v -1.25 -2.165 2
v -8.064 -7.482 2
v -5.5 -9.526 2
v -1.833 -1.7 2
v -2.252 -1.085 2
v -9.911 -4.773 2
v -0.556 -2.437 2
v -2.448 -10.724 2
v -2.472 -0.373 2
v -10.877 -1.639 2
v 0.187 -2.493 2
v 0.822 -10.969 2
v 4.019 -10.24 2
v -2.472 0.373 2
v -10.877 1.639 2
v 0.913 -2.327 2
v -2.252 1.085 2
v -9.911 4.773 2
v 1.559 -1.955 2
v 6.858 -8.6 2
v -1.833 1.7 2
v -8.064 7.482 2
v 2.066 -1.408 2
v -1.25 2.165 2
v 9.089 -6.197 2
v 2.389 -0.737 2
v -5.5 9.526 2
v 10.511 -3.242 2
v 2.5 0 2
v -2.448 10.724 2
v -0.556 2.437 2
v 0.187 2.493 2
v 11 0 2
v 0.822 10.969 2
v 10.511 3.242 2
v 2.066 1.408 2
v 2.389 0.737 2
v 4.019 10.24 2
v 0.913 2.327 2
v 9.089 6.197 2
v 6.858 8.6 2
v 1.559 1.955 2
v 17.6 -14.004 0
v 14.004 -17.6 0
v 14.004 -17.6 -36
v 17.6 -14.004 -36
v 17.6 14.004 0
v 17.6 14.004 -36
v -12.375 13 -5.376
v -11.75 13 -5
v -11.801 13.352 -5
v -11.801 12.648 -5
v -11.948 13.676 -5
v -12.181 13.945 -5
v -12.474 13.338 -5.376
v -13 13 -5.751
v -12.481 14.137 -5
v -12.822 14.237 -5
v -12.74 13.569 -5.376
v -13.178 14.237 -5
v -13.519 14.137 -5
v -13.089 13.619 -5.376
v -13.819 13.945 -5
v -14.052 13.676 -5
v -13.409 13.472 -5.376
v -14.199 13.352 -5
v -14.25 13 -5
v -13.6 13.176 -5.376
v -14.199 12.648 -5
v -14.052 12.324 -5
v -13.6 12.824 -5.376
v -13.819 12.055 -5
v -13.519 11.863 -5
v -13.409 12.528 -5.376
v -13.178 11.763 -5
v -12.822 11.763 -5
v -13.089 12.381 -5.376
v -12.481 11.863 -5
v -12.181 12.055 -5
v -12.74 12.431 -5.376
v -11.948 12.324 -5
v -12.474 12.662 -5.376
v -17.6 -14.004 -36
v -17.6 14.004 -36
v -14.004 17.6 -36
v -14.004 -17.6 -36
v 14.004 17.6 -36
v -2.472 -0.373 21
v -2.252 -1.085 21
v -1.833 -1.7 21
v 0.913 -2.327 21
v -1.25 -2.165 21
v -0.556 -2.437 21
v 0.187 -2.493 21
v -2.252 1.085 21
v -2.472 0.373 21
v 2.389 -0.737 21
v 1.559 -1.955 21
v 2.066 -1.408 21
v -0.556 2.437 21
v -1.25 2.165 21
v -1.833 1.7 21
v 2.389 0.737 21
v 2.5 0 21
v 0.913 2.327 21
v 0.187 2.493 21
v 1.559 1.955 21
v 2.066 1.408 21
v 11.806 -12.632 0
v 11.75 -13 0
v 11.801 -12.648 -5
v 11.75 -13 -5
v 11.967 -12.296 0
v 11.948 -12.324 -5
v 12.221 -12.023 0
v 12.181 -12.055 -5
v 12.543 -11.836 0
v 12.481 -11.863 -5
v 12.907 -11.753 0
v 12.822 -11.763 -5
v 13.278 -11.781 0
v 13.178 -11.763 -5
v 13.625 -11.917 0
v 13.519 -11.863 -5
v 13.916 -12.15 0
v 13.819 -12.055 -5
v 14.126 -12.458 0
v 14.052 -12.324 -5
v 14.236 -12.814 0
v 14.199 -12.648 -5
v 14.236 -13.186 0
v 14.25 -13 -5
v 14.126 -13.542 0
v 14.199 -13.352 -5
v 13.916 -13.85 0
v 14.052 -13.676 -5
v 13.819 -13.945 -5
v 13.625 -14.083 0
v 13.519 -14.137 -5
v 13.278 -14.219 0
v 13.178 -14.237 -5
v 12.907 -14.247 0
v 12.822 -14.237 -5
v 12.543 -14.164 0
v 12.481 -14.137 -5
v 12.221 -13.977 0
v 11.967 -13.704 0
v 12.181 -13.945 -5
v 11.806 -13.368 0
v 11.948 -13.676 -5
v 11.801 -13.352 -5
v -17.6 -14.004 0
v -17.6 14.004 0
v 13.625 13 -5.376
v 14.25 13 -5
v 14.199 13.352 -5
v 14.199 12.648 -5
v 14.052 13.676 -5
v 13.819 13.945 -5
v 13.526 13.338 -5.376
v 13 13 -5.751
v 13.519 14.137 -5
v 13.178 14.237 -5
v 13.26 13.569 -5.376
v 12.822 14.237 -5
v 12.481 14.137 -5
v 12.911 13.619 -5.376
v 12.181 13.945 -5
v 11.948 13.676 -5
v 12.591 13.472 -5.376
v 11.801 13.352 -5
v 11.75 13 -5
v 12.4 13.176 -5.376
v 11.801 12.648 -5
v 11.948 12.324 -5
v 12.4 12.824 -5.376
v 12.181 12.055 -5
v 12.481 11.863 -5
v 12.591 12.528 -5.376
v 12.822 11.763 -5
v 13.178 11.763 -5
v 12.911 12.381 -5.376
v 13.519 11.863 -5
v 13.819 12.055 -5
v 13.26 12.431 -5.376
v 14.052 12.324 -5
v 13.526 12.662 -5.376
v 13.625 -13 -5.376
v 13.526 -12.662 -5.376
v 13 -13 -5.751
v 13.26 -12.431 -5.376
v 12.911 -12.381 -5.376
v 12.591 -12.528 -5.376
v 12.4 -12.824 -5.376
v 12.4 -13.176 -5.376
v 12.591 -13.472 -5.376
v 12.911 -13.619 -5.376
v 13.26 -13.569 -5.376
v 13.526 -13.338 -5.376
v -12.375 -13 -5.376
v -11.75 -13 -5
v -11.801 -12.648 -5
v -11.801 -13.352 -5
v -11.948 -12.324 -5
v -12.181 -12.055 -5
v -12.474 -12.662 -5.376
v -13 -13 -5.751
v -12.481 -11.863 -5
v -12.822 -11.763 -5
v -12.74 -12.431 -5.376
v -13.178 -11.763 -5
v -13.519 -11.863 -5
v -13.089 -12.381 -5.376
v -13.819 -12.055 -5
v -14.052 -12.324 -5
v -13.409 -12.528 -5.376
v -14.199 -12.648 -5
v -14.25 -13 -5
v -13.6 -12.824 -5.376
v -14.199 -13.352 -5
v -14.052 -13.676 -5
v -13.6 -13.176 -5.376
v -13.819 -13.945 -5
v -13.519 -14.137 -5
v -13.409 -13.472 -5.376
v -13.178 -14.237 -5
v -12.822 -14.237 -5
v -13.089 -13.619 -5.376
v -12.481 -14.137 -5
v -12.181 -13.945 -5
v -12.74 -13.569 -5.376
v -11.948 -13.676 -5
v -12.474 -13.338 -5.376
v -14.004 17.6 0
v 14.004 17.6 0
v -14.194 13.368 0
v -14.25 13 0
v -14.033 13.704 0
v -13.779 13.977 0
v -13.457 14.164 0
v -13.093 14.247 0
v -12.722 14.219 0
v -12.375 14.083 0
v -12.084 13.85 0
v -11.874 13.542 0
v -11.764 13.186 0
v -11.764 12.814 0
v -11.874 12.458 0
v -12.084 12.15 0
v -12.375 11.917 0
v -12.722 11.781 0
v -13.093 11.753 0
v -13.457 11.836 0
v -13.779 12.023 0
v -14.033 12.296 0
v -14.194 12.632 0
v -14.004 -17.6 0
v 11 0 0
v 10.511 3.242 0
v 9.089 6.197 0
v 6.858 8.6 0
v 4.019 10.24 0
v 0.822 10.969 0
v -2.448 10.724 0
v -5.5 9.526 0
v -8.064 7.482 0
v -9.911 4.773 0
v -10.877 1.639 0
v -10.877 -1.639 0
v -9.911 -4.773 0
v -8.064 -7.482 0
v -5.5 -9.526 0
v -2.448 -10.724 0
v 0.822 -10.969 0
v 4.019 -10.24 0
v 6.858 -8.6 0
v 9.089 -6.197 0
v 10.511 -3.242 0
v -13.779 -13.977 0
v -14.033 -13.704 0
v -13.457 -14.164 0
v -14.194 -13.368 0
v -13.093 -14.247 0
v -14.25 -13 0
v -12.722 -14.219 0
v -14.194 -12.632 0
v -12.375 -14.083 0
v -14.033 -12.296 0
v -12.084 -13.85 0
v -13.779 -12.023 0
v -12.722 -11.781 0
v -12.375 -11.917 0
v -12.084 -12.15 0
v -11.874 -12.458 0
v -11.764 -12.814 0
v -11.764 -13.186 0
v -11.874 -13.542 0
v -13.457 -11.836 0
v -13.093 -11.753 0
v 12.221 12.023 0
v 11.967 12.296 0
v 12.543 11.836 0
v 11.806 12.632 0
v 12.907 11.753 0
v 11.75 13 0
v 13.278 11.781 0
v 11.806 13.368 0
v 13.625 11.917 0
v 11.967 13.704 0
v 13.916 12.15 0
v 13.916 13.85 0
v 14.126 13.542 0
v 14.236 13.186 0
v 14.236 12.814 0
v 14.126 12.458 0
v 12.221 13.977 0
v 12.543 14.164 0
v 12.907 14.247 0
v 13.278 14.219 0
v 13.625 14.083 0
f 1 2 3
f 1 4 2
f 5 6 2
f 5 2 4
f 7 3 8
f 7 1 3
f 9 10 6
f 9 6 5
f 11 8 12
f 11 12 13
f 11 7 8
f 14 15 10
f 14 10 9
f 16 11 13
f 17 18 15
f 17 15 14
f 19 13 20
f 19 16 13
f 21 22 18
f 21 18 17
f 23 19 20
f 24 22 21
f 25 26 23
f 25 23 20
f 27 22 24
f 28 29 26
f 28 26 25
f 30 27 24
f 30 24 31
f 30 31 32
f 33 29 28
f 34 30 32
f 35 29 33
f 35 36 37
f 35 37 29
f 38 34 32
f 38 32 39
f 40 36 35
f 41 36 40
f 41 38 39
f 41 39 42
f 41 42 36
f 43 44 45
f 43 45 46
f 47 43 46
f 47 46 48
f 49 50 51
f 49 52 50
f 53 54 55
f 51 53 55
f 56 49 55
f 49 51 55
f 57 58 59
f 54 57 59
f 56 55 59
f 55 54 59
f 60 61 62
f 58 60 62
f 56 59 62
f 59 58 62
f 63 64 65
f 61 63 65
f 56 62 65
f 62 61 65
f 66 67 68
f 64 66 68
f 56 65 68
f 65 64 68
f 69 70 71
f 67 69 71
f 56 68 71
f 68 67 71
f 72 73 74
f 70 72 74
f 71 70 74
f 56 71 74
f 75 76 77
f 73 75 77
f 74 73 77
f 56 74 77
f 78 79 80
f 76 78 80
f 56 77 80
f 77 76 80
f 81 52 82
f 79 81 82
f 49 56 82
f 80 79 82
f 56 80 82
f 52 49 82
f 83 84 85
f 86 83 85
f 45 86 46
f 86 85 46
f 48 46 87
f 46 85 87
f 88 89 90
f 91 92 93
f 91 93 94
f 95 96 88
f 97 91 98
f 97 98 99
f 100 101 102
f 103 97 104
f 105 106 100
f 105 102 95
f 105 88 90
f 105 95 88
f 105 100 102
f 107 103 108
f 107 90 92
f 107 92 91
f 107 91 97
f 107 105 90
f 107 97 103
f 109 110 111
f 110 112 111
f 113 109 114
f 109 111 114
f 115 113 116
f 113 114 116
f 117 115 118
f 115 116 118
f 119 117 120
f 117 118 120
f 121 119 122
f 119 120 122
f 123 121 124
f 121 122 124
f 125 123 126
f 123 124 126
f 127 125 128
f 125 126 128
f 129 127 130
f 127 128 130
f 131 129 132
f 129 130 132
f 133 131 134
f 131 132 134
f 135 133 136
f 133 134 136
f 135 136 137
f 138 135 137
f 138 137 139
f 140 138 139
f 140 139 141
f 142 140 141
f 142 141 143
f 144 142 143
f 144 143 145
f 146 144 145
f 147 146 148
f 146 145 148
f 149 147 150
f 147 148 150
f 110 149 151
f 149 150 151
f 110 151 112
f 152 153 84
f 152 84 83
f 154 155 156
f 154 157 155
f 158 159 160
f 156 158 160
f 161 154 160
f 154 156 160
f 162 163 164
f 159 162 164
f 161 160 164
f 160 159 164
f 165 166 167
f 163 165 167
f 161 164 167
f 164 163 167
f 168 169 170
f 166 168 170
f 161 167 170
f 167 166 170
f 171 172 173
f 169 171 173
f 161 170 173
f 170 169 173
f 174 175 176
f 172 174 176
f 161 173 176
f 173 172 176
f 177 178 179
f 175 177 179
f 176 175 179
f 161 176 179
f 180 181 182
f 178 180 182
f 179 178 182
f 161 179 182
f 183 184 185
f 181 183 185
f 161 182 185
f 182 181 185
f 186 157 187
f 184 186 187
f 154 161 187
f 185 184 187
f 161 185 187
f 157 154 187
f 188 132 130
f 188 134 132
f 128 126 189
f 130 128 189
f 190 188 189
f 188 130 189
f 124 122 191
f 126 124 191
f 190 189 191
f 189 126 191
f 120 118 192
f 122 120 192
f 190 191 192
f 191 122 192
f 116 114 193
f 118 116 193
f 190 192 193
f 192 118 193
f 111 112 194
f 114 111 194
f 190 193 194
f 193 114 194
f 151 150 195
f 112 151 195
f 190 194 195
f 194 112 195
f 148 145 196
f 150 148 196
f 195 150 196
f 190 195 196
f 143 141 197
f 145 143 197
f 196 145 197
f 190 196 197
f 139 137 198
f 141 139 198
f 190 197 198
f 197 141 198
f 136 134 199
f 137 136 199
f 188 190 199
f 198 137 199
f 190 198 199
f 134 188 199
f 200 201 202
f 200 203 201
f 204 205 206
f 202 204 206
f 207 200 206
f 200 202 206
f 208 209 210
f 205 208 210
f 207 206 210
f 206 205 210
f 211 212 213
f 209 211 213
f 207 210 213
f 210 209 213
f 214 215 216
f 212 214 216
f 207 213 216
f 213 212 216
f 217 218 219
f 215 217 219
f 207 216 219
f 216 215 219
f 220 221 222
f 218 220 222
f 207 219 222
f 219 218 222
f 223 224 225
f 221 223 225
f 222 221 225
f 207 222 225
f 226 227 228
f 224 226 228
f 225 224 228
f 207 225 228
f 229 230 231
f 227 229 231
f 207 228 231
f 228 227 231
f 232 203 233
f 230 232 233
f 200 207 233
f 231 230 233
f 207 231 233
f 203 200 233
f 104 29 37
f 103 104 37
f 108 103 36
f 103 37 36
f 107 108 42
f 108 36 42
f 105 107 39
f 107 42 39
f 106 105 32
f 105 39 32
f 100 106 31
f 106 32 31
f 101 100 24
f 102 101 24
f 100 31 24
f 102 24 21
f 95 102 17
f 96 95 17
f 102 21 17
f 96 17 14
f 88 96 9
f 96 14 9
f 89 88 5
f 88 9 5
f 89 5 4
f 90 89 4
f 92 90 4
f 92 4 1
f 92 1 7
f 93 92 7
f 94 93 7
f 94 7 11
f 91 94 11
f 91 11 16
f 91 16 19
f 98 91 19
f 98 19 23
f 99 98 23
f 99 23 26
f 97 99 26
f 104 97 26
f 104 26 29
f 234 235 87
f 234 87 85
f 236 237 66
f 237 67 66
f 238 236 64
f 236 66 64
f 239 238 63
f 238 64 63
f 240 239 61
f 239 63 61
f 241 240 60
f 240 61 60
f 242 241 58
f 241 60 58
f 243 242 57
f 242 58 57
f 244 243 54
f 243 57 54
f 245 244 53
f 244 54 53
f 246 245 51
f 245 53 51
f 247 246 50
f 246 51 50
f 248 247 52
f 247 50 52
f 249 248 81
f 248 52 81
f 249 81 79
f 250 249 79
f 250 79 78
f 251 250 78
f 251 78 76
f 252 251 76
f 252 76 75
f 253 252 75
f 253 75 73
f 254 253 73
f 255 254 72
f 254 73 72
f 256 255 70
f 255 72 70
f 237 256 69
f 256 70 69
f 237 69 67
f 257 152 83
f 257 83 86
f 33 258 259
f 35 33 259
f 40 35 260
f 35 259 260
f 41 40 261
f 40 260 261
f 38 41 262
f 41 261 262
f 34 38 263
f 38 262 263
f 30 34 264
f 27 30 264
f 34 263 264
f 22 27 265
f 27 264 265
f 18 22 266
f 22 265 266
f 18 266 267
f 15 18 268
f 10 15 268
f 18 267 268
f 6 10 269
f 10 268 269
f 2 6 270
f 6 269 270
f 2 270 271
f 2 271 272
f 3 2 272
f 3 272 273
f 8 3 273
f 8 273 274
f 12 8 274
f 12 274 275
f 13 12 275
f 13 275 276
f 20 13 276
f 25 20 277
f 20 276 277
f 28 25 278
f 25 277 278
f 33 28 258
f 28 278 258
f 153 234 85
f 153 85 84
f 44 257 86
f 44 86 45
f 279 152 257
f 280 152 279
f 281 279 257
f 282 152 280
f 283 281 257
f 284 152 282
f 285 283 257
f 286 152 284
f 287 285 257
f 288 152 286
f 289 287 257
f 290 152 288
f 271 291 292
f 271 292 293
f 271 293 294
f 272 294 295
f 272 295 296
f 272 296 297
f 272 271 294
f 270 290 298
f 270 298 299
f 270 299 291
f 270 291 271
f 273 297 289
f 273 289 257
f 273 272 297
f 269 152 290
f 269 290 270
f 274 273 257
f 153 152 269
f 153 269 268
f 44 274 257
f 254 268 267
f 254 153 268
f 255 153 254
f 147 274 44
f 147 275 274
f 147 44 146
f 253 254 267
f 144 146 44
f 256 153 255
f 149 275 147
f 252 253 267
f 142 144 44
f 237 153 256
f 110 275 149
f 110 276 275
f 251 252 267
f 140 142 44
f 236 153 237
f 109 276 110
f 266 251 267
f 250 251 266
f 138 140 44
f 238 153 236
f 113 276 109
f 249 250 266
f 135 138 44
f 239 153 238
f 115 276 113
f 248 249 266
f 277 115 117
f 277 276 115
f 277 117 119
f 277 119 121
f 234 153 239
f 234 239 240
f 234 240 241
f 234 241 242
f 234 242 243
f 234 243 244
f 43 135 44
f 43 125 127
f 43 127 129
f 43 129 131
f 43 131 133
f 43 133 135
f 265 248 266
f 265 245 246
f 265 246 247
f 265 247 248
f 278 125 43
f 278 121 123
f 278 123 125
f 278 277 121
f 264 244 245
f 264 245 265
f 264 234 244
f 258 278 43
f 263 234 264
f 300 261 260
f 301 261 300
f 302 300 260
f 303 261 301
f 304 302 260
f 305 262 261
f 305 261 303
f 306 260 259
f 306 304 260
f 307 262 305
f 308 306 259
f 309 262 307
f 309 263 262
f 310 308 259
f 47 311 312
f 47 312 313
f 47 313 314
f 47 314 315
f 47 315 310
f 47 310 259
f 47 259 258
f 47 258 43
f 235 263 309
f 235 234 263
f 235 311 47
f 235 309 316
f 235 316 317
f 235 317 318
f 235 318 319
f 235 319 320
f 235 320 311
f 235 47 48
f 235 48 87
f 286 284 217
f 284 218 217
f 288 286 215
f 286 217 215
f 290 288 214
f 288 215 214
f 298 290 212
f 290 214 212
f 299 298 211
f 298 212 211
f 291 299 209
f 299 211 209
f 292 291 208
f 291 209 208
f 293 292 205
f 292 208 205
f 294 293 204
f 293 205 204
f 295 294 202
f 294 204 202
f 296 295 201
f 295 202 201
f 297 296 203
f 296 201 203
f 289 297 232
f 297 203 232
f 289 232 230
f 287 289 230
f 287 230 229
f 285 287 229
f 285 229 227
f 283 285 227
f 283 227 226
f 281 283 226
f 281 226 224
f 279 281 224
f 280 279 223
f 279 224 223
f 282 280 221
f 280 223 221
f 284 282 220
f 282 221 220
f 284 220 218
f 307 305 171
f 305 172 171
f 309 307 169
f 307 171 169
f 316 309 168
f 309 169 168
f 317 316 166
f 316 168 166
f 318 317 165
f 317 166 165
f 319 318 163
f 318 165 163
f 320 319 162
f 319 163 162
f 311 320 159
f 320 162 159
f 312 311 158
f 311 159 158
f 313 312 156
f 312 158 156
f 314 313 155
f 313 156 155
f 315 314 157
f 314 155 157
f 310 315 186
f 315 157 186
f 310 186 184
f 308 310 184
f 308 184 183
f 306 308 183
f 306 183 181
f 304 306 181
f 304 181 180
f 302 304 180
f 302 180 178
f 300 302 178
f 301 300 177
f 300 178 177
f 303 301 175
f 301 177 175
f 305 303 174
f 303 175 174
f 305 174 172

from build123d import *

# Parameters (mm, degrees)
BOSS_EXTRUDE1_DEPTH       = 36
SKETCH2_R                 = 11
BOSS_EXTRUDE2_DEPTH       = 2
SKETCH3_R                 = 2.5
BOSS_EXTRUDE3_DEPTH       = 21
M3X0_5_TAPPED_HOLE1_D     = 2.5
M3X0_5_TAPPED_HOLE1_DEPTH = 5
M3X0_5_TAPPED_HOLE1_TIP   = 0.751075774


with BuildPart() as part:
    # Sketch1 → Boss-Extrude1 (new body)
    with BuildSketch(Plane.XY):
        Polygon((-14.003805752, -17.6), (14.003805752, -17.6), (17.6, -14.003805752), (17.6, 14.003805752), (14.003805752, 17.6), (-14.003805752, 17.6), (-17.6, 14.003805752), (-17.6, -14.003805752), align=None)
    extrude(amount=-BOSS_EXTRUDE1_DEPTH)

    # Sketch2 → Boss-Extrude2 (add)
    with BuildSketch(Plane.XY):
        Circle(SKETCH2_R)
    extrude(amount=BOSS_EXTRUDE2_DEPTH)

    # Sketch3 → Boss-Extrude3 (add)
    with BuildSketch(Plane.XY):
        Circle(SKETCH3_R)
    extrude(amount=BOSS_EXTRUDE3_DEPTH)

    # M3x0.5 Tapped Hole1
    with Locations(Plane.XY):
        with Locations((-13, -13), (13, -13), (13, 13), (-13, 13)):
            Hole(M3X0_5_TAPPED_HOLE1_D / 2, depth=M3X0_5_TAPPED_HOLE1_DEPTH)
            with Locations((0, 0, -(M3X0_5_TAPPED_HOLE1_DEPTH + M3X0_5_TAPPED_HOLE1_TIP / 2))):  # 118° drill point
                Cone(0, M3X0_5_TAPPED_HOLE1_D / 2, M3X0_5_TAPPED_HOLE1_TIP, mode=Mode.SUBTRACT)


solid = part.part
